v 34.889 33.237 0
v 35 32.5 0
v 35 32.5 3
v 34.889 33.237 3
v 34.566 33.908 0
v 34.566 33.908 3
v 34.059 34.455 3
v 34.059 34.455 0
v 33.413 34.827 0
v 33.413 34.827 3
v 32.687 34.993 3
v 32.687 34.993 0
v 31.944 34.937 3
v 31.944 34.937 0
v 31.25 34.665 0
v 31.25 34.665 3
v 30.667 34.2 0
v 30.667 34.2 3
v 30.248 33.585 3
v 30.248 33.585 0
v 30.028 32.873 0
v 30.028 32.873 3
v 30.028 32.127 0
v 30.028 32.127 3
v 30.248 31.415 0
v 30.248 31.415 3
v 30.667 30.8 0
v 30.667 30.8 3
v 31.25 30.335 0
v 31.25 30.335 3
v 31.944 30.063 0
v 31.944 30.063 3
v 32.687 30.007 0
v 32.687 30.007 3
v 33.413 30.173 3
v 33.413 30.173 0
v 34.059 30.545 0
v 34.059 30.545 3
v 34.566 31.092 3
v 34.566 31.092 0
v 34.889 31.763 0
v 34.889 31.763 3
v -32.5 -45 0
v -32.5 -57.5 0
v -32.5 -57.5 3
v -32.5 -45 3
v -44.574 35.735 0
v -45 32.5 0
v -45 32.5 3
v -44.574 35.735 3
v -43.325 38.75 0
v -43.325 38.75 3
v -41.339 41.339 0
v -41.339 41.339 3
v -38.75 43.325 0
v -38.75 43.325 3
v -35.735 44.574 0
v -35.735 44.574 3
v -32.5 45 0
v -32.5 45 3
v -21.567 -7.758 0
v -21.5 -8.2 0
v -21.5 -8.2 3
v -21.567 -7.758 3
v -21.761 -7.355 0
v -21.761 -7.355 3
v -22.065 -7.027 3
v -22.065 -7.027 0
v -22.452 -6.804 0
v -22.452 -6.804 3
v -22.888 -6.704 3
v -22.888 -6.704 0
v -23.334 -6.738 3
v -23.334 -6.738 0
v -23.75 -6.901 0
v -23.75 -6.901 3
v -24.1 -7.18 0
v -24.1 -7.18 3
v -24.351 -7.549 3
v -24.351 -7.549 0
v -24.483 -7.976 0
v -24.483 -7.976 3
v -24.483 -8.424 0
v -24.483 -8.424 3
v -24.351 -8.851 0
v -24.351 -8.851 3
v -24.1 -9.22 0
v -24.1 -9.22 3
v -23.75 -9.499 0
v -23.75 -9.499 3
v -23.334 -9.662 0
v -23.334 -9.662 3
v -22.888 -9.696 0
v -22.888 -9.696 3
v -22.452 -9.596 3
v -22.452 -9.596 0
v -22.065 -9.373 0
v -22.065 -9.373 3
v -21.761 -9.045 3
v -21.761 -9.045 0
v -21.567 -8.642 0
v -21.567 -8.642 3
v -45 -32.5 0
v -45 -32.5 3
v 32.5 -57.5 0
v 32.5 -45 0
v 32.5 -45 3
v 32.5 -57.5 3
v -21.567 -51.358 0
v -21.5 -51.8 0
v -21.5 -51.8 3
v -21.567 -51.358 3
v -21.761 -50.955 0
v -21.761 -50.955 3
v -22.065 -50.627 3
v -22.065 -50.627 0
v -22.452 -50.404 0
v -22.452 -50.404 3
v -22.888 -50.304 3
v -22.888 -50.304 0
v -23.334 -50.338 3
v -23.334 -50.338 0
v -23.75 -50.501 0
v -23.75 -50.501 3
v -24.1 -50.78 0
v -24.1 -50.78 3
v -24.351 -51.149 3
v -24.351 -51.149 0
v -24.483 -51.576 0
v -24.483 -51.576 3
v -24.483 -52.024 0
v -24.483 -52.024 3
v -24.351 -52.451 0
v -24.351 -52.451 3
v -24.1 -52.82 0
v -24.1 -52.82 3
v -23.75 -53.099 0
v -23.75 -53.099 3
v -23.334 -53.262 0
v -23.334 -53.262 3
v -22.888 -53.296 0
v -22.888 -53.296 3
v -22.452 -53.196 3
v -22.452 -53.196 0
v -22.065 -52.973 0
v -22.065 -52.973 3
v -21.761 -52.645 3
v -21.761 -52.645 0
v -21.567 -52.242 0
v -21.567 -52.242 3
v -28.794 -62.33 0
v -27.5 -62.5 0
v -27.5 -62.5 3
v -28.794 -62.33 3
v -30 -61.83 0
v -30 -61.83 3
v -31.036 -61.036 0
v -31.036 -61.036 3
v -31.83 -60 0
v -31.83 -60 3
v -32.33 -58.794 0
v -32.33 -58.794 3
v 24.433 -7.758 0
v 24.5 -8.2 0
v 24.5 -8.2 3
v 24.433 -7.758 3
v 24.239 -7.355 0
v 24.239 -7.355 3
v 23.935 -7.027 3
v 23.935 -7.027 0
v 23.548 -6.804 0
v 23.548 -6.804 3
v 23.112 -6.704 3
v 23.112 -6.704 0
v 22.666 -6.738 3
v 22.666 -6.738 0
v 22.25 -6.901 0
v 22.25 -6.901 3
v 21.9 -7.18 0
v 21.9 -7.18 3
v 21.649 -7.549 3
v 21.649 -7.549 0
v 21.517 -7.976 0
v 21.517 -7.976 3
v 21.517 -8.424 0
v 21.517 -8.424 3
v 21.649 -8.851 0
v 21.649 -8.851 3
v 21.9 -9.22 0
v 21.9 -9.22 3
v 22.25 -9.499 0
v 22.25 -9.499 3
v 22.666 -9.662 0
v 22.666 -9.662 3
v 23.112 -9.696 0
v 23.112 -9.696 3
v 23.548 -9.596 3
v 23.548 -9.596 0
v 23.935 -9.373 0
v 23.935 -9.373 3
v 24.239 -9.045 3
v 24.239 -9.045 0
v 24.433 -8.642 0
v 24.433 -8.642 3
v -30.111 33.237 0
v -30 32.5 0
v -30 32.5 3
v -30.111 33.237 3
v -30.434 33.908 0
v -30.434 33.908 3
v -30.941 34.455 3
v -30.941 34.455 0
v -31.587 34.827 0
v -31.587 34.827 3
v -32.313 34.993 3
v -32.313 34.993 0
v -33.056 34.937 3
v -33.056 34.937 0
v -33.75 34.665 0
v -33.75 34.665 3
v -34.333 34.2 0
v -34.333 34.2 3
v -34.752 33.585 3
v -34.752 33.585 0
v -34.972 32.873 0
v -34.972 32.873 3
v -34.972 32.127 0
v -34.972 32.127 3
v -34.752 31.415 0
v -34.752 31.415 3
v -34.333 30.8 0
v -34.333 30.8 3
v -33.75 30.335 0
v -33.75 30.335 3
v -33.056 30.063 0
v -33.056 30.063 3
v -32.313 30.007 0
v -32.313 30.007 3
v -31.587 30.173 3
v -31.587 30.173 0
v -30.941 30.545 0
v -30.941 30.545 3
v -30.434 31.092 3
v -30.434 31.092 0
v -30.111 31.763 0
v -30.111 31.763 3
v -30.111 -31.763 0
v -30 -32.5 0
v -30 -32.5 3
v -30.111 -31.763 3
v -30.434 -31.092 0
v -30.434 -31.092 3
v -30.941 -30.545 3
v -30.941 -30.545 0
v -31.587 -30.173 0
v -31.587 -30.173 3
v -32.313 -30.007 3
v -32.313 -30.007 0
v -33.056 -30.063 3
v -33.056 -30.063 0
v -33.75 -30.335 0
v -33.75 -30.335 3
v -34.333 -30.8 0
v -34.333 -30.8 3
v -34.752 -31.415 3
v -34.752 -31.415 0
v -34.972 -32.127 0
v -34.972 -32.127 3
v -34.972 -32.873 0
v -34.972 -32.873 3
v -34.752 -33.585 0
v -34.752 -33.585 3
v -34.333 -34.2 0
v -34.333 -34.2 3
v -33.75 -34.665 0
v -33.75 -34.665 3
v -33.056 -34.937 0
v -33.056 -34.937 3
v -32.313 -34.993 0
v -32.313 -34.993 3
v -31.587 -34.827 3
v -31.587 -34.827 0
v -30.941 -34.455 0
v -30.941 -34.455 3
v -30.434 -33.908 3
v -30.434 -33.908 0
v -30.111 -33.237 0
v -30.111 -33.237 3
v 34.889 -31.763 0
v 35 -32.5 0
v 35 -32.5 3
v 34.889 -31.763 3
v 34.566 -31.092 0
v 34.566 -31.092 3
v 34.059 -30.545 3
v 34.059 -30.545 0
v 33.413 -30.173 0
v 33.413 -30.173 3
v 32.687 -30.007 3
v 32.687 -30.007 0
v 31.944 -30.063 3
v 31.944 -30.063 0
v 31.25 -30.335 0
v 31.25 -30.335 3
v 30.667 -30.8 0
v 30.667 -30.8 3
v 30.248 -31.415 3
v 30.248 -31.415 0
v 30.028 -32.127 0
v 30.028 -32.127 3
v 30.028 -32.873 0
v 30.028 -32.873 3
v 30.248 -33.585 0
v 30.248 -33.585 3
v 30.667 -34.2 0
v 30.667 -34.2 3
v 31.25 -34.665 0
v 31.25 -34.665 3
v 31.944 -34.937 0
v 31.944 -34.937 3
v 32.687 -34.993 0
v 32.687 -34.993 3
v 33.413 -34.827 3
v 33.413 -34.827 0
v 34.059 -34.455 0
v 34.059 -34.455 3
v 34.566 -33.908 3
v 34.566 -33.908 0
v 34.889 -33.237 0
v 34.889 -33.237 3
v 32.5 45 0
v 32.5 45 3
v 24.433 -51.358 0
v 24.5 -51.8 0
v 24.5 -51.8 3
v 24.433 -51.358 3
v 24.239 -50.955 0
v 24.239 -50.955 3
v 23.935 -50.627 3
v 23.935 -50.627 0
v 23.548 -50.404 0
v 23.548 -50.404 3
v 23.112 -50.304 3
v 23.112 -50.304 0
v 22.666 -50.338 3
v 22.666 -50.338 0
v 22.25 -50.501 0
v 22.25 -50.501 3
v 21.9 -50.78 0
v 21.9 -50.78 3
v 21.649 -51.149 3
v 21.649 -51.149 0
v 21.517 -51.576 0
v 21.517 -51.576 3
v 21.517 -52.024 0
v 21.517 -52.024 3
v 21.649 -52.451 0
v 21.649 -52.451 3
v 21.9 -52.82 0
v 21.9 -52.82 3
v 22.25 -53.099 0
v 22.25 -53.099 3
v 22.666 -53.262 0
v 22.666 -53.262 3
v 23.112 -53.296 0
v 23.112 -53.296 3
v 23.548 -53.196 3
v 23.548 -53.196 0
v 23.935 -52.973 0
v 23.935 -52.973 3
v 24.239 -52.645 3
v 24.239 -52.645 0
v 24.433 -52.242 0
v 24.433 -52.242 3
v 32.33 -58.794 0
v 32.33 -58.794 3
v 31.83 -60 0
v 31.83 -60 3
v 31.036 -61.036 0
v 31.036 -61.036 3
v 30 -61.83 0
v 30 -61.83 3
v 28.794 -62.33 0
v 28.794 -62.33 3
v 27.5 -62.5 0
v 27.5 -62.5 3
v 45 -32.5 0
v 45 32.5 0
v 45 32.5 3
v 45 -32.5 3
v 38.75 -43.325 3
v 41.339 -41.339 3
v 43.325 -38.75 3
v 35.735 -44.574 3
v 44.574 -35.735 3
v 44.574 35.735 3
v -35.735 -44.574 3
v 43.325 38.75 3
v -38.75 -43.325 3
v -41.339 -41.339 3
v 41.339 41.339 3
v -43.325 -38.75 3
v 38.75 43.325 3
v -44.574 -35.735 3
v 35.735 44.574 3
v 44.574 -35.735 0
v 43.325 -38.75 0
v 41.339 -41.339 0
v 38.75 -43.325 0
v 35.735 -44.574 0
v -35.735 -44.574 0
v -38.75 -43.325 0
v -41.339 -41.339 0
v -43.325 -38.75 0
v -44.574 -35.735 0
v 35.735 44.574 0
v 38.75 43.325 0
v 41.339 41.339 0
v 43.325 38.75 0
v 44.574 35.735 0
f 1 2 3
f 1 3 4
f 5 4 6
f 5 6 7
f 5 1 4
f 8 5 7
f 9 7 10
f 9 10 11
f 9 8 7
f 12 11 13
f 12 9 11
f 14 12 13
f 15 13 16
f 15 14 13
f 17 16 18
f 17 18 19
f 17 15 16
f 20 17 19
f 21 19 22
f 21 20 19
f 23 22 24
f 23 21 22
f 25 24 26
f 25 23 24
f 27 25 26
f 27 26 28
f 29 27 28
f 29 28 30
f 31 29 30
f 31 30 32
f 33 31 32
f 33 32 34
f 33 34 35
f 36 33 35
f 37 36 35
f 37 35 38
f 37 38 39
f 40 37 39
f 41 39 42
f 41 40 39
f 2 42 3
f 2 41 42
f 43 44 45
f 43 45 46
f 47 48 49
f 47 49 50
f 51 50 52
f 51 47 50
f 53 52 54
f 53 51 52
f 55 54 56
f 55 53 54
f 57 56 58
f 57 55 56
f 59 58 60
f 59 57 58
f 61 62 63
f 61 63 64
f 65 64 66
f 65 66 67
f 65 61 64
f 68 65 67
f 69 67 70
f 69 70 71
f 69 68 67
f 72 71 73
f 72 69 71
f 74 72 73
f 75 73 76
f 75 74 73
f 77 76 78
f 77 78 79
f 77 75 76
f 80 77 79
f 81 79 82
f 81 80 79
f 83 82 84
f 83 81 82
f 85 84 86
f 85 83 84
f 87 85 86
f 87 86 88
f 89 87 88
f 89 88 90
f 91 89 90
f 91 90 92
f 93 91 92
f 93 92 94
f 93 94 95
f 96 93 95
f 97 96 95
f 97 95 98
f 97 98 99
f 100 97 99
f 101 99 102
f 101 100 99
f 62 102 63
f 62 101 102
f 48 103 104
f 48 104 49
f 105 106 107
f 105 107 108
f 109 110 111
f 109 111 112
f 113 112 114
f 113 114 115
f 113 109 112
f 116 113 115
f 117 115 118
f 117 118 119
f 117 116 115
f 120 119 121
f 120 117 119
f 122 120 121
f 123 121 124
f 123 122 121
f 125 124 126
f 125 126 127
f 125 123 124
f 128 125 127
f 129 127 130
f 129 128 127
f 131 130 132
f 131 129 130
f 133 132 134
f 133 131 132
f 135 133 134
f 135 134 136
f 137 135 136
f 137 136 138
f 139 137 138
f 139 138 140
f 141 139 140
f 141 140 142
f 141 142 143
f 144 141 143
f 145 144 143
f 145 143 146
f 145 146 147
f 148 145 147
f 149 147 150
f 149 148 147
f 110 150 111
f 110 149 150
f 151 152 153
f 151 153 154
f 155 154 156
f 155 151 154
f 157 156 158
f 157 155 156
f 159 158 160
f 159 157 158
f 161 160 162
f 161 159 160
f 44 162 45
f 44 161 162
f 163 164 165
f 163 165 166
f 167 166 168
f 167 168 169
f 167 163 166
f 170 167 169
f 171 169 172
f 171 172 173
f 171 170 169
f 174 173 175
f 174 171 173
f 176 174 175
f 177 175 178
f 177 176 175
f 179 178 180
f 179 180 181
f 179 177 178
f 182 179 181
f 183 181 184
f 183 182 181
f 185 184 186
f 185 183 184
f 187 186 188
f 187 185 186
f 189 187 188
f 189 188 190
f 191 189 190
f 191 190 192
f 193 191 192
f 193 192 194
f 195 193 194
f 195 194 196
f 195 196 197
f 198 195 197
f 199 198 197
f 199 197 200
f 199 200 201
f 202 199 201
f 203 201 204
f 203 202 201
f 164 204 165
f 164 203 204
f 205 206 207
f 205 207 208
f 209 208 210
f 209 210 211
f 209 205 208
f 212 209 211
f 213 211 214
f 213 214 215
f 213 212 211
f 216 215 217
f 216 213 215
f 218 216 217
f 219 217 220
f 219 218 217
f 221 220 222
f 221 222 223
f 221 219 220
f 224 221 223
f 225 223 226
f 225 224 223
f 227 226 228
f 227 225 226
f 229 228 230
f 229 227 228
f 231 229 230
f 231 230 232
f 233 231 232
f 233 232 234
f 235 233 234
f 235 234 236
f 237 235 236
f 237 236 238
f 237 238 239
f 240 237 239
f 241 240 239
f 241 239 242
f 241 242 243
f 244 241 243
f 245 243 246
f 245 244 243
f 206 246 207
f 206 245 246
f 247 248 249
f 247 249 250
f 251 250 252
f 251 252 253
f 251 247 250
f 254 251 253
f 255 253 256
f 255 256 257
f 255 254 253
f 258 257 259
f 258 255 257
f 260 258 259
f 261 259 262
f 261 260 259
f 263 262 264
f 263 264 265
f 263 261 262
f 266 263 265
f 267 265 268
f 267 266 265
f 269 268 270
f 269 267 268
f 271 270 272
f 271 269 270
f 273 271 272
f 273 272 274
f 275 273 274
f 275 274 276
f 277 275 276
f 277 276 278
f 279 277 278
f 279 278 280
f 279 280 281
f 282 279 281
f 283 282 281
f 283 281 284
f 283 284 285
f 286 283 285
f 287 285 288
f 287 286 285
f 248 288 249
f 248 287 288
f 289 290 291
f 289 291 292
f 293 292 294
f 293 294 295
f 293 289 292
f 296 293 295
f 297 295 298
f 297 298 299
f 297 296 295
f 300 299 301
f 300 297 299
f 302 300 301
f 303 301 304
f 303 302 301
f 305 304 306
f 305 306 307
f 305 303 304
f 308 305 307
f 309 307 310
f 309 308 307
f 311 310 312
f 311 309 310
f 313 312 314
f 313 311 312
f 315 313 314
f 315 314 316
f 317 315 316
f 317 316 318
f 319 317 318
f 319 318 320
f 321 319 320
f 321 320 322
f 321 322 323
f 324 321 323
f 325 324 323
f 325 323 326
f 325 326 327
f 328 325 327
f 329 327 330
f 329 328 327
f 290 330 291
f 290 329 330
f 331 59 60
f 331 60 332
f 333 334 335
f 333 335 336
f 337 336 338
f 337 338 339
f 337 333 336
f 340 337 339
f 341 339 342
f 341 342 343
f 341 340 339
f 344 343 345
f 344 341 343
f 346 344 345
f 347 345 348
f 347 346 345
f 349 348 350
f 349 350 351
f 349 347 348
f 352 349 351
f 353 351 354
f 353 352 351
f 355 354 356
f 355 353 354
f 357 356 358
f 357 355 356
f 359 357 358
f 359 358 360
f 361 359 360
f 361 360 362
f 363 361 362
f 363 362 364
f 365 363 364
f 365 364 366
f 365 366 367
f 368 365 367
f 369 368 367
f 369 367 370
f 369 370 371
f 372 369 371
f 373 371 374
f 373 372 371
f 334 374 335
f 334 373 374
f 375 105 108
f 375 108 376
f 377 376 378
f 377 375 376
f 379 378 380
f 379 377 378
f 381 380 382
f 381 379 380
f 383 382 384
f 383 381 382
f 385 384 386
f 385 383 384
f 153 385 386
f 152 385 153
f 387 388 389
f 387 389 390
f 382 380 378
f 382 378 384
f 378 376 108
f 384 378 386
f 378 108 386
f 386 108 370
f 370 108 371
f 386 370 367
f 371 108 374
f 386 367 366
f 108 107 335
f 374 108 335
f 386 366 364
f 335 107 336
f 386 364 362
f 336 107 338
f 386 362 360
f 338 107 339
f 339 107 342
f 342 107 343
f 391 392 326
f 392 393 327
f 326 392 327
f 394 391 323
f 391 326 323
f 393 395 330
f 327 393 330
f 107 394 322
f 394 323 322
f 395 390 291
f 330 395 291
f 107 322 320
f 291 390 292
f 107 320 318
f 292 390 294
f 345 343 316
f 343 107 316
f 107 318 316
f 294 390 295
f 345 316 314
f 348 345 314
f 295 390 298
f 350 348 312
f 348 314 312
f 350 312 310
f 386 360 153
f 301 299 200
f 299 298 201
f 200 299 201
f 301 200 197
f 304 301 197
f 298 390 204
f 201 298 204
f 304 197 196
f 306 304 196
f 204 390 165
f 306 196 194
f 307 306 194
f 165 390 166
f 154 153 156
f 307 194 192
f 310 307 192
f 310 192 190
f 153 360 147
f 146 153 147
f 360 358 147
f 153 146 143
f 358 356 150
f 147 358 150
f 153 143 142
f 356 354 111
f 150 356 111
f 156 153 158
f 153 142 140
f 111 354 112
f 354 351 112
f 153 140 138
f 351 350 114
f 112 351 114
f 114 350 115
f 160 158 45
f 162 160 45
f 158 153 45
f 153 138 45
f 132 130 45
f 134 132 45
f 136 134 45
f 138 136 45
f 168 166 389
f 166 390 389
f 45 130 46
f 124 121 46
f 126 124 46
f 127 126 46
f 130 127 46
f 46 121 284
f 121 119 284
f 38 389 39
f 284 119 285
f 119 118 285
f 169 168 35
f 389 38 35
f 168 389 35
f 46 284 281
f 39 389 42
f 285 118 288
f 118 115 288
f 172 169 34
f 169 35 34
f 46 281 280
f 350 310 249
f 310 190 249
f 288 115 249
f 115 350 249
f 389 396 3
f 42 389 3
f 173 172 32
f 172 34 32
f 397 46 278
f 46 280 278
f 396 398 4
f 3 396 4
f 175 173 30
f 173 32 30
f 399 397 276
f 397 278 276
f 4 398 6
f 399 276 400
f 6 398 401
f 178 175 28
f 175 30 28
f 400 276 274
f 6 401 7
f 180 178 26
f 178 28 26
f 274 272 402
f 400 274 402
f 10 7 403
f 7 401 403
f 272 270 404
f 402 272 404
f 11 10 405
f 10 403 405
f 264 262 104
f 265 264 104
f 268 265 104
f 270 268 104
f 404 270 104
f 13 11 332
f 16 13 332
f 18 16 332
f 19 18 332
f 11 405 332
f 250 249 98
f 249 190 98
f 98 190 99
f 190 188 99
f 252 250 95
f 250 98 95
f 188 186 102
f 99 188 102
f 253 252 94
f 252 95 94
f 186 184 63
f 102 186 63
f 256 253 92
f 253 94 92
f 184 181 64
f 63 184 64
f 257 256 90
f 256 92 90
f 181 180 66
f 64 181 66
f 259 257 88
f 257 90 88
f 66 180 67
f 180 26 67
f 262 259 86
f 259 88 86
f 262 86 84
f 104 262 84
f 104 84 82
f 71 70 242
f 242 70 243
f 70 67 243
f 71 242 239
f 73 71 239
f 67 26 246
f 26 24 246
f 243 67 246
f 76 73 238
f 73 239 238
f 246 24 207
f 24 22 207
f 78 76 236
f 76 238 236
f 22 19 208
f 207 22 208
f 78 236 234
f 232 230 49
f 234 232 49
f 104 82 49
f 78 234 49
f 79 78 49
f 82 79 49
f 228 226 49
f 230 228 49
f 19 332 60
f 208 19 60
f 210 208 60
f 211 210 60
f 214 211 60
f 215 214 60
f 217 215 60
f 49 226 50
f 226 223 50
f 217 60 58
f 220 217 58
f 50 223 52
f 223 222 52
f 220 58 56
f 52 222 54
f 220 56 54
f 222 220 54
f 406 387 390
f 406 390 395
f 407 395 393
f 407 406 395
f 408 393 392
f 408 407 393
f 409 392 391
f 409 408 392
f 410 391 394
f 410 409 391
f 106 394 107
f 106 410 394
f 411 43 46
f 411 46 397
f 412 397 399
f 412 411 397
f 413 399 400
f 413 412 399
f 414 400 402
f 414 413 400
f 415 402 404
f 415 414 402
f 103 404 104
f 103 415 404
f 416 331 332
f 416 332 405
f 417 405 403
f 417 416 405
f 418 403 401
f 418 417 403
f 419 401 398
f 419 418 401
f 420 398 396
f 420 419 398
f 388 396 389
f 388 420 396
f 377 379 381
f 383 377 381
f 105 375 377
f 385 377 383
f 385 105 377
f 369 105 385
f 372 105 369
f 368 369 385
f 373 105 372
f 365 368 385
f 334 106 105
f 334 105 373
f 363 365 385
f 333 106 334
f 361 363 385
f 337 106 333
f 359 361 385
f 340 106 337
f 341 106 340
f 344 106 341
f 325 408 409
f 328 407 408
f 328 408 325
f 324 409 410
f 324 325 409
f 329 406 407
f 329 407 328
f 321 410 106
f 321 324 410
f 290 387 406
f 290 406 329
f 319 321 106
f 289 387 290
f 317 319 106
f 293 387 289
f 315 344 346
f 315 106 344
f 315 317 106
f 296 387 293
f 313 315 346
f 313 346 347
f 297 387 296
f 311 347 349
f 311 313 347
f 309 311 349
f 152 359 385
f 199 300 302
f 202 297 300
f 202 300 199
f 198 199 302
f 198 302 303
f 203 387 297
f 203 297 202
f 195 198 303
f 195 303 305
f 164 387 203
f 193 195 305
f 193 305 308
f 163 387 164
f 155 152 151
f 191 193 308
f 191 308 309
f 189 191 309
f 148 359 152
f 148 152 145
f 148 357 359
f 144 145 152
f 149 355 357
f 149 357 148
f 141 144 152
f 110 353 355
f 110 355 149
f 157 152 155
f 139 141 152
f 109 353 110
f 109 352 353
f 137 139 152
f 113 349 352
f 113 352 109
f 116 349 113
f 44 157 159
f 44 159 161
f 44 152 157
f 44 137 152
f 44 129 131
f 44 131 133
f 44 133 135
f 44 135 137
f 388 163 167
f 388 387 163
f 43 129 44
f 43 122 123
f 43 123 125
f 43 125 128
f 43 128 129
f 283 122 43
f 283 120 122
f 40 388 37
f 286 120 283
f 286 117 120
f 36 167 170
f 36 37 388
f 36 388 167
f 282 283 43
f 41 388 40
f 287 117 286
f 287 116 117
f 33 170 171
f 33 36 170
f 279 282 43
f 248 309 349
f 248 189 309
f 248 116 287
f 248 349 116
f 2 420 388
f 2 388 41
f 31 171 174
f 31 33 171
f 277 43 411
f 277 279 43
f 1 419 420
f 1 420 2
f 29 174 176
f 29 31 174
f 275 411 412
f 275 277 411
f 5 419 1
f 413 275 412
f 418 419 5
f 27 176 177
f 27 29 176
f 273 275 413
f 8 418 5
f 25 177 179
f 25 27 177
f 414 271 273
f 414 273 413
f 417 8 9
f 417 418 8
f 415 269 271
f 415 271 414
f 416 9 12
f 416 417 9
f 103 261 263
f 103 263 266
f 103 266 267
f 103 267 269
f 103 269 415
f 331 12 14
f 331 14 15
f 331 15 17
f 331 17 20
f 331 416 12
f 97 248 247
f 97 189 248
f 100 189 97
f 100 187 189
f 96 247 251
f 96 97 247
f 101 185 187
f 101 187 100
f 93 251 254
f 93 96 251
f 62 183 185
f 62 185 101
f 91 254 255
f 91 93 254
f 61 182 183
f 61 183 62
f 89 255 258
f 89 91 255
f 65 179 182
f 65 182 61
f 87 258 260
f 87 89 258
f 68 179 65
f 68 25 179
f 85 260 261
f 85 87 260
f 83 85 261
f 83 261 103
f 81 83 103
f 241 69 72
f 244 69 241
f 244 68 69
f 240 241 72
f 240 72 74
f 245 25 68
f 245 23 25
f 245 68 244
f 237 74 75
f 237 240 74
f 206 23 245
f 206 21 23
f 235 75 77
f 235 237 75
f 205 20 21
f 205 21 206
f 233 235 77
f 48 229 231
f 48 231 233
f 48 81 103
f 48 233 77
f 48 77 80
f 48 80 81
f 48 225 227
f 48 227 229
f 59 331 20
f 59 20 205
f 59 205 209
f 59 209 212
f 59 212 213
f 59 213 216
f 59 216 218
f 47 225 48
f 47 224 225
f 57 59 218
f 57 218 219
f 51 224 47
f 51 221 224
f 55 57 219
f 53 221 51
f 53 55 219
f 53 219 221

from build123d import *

# Parameters (mm, degrees)
SKETCH1_R           = 1.5
SKETCH1_R_2         = 2.5
BOSS_EXTRUDE1_DEPTH = 3


with BuildPart() as part:
    # Sketch1 → Boss-Extrude1 (new body)
    with BuildSketch(Plane.XY):
        with BuildLine():
            Line((-32.5, 45), (32.5, 45))
            ThreePointArc((32.5, 45), (41.338834765, 41.338834765), (45, 32.5))
            Line((45, 32.5), (45, -32.5))
            ThreePointArc((45, -32.5), (41.338834765, -41.338834765), (32.5, -45))
            Line((32.5, -45), (32.5, -57.5))
            ThreePointArc((32.5, -57.5), (31.035533906, -61.035533906), (27.5, -62.5))
            Line((27.5, -62.5), (-27.5, -62.5))
            ThreePointArc((-27.5, -62.5), (-31.035533906, -61.035533906), (-32.5, -57.5))
            Line((-32.5, -57.5), (-32.5, -45))
            ThreePointArc((-32.5, -45), (-41.338834765, -41.338834765), (-45, -32.5))
            Line((-45, -32.5), (-45, 32.5))
            ThreePointArc((-45, 32.5), (-41.338834765, 41.338834765), (-32.5, 45))
        make_face()
        with Locations((-23, -8.2)):
            Circle(SKETCH1_R, mode=Mode.SUBTRACT)
        with Locations((23, -8.2)):
            Circle(SKETCH1_R, mode=Mode.SUBTRACT)
        with Locations((23, -51.8)):
            Circle(SKETCH1_R, mode=Mode.SUBTRACT)
        with Locations((-23, -51.8)):
            Circle(SKETCH1_R, mode=Mode.SUBTRACT)
        with Locations((-32.5, 32.5)):
            Circle(SKETCH1_R_2, mode=Mode.SUBTRACT)
        with Locations((32.5, 32.5)):
            Circle(SKETCH1_R_2, mode=Mode.SUBTRACT)
        with Locations((32.5, -32.5)):
            Circle(SKETCH1_R_2, mode=Mode.SUBTRACT)
        with Locations((-32.5, -32.5)):
            Circle(SKETCH1_R_2, mode=Mode.SUBTRACT)
    extrude(amount=BOSS_EXTRUDE1_DEPTH)


solid = part.part
